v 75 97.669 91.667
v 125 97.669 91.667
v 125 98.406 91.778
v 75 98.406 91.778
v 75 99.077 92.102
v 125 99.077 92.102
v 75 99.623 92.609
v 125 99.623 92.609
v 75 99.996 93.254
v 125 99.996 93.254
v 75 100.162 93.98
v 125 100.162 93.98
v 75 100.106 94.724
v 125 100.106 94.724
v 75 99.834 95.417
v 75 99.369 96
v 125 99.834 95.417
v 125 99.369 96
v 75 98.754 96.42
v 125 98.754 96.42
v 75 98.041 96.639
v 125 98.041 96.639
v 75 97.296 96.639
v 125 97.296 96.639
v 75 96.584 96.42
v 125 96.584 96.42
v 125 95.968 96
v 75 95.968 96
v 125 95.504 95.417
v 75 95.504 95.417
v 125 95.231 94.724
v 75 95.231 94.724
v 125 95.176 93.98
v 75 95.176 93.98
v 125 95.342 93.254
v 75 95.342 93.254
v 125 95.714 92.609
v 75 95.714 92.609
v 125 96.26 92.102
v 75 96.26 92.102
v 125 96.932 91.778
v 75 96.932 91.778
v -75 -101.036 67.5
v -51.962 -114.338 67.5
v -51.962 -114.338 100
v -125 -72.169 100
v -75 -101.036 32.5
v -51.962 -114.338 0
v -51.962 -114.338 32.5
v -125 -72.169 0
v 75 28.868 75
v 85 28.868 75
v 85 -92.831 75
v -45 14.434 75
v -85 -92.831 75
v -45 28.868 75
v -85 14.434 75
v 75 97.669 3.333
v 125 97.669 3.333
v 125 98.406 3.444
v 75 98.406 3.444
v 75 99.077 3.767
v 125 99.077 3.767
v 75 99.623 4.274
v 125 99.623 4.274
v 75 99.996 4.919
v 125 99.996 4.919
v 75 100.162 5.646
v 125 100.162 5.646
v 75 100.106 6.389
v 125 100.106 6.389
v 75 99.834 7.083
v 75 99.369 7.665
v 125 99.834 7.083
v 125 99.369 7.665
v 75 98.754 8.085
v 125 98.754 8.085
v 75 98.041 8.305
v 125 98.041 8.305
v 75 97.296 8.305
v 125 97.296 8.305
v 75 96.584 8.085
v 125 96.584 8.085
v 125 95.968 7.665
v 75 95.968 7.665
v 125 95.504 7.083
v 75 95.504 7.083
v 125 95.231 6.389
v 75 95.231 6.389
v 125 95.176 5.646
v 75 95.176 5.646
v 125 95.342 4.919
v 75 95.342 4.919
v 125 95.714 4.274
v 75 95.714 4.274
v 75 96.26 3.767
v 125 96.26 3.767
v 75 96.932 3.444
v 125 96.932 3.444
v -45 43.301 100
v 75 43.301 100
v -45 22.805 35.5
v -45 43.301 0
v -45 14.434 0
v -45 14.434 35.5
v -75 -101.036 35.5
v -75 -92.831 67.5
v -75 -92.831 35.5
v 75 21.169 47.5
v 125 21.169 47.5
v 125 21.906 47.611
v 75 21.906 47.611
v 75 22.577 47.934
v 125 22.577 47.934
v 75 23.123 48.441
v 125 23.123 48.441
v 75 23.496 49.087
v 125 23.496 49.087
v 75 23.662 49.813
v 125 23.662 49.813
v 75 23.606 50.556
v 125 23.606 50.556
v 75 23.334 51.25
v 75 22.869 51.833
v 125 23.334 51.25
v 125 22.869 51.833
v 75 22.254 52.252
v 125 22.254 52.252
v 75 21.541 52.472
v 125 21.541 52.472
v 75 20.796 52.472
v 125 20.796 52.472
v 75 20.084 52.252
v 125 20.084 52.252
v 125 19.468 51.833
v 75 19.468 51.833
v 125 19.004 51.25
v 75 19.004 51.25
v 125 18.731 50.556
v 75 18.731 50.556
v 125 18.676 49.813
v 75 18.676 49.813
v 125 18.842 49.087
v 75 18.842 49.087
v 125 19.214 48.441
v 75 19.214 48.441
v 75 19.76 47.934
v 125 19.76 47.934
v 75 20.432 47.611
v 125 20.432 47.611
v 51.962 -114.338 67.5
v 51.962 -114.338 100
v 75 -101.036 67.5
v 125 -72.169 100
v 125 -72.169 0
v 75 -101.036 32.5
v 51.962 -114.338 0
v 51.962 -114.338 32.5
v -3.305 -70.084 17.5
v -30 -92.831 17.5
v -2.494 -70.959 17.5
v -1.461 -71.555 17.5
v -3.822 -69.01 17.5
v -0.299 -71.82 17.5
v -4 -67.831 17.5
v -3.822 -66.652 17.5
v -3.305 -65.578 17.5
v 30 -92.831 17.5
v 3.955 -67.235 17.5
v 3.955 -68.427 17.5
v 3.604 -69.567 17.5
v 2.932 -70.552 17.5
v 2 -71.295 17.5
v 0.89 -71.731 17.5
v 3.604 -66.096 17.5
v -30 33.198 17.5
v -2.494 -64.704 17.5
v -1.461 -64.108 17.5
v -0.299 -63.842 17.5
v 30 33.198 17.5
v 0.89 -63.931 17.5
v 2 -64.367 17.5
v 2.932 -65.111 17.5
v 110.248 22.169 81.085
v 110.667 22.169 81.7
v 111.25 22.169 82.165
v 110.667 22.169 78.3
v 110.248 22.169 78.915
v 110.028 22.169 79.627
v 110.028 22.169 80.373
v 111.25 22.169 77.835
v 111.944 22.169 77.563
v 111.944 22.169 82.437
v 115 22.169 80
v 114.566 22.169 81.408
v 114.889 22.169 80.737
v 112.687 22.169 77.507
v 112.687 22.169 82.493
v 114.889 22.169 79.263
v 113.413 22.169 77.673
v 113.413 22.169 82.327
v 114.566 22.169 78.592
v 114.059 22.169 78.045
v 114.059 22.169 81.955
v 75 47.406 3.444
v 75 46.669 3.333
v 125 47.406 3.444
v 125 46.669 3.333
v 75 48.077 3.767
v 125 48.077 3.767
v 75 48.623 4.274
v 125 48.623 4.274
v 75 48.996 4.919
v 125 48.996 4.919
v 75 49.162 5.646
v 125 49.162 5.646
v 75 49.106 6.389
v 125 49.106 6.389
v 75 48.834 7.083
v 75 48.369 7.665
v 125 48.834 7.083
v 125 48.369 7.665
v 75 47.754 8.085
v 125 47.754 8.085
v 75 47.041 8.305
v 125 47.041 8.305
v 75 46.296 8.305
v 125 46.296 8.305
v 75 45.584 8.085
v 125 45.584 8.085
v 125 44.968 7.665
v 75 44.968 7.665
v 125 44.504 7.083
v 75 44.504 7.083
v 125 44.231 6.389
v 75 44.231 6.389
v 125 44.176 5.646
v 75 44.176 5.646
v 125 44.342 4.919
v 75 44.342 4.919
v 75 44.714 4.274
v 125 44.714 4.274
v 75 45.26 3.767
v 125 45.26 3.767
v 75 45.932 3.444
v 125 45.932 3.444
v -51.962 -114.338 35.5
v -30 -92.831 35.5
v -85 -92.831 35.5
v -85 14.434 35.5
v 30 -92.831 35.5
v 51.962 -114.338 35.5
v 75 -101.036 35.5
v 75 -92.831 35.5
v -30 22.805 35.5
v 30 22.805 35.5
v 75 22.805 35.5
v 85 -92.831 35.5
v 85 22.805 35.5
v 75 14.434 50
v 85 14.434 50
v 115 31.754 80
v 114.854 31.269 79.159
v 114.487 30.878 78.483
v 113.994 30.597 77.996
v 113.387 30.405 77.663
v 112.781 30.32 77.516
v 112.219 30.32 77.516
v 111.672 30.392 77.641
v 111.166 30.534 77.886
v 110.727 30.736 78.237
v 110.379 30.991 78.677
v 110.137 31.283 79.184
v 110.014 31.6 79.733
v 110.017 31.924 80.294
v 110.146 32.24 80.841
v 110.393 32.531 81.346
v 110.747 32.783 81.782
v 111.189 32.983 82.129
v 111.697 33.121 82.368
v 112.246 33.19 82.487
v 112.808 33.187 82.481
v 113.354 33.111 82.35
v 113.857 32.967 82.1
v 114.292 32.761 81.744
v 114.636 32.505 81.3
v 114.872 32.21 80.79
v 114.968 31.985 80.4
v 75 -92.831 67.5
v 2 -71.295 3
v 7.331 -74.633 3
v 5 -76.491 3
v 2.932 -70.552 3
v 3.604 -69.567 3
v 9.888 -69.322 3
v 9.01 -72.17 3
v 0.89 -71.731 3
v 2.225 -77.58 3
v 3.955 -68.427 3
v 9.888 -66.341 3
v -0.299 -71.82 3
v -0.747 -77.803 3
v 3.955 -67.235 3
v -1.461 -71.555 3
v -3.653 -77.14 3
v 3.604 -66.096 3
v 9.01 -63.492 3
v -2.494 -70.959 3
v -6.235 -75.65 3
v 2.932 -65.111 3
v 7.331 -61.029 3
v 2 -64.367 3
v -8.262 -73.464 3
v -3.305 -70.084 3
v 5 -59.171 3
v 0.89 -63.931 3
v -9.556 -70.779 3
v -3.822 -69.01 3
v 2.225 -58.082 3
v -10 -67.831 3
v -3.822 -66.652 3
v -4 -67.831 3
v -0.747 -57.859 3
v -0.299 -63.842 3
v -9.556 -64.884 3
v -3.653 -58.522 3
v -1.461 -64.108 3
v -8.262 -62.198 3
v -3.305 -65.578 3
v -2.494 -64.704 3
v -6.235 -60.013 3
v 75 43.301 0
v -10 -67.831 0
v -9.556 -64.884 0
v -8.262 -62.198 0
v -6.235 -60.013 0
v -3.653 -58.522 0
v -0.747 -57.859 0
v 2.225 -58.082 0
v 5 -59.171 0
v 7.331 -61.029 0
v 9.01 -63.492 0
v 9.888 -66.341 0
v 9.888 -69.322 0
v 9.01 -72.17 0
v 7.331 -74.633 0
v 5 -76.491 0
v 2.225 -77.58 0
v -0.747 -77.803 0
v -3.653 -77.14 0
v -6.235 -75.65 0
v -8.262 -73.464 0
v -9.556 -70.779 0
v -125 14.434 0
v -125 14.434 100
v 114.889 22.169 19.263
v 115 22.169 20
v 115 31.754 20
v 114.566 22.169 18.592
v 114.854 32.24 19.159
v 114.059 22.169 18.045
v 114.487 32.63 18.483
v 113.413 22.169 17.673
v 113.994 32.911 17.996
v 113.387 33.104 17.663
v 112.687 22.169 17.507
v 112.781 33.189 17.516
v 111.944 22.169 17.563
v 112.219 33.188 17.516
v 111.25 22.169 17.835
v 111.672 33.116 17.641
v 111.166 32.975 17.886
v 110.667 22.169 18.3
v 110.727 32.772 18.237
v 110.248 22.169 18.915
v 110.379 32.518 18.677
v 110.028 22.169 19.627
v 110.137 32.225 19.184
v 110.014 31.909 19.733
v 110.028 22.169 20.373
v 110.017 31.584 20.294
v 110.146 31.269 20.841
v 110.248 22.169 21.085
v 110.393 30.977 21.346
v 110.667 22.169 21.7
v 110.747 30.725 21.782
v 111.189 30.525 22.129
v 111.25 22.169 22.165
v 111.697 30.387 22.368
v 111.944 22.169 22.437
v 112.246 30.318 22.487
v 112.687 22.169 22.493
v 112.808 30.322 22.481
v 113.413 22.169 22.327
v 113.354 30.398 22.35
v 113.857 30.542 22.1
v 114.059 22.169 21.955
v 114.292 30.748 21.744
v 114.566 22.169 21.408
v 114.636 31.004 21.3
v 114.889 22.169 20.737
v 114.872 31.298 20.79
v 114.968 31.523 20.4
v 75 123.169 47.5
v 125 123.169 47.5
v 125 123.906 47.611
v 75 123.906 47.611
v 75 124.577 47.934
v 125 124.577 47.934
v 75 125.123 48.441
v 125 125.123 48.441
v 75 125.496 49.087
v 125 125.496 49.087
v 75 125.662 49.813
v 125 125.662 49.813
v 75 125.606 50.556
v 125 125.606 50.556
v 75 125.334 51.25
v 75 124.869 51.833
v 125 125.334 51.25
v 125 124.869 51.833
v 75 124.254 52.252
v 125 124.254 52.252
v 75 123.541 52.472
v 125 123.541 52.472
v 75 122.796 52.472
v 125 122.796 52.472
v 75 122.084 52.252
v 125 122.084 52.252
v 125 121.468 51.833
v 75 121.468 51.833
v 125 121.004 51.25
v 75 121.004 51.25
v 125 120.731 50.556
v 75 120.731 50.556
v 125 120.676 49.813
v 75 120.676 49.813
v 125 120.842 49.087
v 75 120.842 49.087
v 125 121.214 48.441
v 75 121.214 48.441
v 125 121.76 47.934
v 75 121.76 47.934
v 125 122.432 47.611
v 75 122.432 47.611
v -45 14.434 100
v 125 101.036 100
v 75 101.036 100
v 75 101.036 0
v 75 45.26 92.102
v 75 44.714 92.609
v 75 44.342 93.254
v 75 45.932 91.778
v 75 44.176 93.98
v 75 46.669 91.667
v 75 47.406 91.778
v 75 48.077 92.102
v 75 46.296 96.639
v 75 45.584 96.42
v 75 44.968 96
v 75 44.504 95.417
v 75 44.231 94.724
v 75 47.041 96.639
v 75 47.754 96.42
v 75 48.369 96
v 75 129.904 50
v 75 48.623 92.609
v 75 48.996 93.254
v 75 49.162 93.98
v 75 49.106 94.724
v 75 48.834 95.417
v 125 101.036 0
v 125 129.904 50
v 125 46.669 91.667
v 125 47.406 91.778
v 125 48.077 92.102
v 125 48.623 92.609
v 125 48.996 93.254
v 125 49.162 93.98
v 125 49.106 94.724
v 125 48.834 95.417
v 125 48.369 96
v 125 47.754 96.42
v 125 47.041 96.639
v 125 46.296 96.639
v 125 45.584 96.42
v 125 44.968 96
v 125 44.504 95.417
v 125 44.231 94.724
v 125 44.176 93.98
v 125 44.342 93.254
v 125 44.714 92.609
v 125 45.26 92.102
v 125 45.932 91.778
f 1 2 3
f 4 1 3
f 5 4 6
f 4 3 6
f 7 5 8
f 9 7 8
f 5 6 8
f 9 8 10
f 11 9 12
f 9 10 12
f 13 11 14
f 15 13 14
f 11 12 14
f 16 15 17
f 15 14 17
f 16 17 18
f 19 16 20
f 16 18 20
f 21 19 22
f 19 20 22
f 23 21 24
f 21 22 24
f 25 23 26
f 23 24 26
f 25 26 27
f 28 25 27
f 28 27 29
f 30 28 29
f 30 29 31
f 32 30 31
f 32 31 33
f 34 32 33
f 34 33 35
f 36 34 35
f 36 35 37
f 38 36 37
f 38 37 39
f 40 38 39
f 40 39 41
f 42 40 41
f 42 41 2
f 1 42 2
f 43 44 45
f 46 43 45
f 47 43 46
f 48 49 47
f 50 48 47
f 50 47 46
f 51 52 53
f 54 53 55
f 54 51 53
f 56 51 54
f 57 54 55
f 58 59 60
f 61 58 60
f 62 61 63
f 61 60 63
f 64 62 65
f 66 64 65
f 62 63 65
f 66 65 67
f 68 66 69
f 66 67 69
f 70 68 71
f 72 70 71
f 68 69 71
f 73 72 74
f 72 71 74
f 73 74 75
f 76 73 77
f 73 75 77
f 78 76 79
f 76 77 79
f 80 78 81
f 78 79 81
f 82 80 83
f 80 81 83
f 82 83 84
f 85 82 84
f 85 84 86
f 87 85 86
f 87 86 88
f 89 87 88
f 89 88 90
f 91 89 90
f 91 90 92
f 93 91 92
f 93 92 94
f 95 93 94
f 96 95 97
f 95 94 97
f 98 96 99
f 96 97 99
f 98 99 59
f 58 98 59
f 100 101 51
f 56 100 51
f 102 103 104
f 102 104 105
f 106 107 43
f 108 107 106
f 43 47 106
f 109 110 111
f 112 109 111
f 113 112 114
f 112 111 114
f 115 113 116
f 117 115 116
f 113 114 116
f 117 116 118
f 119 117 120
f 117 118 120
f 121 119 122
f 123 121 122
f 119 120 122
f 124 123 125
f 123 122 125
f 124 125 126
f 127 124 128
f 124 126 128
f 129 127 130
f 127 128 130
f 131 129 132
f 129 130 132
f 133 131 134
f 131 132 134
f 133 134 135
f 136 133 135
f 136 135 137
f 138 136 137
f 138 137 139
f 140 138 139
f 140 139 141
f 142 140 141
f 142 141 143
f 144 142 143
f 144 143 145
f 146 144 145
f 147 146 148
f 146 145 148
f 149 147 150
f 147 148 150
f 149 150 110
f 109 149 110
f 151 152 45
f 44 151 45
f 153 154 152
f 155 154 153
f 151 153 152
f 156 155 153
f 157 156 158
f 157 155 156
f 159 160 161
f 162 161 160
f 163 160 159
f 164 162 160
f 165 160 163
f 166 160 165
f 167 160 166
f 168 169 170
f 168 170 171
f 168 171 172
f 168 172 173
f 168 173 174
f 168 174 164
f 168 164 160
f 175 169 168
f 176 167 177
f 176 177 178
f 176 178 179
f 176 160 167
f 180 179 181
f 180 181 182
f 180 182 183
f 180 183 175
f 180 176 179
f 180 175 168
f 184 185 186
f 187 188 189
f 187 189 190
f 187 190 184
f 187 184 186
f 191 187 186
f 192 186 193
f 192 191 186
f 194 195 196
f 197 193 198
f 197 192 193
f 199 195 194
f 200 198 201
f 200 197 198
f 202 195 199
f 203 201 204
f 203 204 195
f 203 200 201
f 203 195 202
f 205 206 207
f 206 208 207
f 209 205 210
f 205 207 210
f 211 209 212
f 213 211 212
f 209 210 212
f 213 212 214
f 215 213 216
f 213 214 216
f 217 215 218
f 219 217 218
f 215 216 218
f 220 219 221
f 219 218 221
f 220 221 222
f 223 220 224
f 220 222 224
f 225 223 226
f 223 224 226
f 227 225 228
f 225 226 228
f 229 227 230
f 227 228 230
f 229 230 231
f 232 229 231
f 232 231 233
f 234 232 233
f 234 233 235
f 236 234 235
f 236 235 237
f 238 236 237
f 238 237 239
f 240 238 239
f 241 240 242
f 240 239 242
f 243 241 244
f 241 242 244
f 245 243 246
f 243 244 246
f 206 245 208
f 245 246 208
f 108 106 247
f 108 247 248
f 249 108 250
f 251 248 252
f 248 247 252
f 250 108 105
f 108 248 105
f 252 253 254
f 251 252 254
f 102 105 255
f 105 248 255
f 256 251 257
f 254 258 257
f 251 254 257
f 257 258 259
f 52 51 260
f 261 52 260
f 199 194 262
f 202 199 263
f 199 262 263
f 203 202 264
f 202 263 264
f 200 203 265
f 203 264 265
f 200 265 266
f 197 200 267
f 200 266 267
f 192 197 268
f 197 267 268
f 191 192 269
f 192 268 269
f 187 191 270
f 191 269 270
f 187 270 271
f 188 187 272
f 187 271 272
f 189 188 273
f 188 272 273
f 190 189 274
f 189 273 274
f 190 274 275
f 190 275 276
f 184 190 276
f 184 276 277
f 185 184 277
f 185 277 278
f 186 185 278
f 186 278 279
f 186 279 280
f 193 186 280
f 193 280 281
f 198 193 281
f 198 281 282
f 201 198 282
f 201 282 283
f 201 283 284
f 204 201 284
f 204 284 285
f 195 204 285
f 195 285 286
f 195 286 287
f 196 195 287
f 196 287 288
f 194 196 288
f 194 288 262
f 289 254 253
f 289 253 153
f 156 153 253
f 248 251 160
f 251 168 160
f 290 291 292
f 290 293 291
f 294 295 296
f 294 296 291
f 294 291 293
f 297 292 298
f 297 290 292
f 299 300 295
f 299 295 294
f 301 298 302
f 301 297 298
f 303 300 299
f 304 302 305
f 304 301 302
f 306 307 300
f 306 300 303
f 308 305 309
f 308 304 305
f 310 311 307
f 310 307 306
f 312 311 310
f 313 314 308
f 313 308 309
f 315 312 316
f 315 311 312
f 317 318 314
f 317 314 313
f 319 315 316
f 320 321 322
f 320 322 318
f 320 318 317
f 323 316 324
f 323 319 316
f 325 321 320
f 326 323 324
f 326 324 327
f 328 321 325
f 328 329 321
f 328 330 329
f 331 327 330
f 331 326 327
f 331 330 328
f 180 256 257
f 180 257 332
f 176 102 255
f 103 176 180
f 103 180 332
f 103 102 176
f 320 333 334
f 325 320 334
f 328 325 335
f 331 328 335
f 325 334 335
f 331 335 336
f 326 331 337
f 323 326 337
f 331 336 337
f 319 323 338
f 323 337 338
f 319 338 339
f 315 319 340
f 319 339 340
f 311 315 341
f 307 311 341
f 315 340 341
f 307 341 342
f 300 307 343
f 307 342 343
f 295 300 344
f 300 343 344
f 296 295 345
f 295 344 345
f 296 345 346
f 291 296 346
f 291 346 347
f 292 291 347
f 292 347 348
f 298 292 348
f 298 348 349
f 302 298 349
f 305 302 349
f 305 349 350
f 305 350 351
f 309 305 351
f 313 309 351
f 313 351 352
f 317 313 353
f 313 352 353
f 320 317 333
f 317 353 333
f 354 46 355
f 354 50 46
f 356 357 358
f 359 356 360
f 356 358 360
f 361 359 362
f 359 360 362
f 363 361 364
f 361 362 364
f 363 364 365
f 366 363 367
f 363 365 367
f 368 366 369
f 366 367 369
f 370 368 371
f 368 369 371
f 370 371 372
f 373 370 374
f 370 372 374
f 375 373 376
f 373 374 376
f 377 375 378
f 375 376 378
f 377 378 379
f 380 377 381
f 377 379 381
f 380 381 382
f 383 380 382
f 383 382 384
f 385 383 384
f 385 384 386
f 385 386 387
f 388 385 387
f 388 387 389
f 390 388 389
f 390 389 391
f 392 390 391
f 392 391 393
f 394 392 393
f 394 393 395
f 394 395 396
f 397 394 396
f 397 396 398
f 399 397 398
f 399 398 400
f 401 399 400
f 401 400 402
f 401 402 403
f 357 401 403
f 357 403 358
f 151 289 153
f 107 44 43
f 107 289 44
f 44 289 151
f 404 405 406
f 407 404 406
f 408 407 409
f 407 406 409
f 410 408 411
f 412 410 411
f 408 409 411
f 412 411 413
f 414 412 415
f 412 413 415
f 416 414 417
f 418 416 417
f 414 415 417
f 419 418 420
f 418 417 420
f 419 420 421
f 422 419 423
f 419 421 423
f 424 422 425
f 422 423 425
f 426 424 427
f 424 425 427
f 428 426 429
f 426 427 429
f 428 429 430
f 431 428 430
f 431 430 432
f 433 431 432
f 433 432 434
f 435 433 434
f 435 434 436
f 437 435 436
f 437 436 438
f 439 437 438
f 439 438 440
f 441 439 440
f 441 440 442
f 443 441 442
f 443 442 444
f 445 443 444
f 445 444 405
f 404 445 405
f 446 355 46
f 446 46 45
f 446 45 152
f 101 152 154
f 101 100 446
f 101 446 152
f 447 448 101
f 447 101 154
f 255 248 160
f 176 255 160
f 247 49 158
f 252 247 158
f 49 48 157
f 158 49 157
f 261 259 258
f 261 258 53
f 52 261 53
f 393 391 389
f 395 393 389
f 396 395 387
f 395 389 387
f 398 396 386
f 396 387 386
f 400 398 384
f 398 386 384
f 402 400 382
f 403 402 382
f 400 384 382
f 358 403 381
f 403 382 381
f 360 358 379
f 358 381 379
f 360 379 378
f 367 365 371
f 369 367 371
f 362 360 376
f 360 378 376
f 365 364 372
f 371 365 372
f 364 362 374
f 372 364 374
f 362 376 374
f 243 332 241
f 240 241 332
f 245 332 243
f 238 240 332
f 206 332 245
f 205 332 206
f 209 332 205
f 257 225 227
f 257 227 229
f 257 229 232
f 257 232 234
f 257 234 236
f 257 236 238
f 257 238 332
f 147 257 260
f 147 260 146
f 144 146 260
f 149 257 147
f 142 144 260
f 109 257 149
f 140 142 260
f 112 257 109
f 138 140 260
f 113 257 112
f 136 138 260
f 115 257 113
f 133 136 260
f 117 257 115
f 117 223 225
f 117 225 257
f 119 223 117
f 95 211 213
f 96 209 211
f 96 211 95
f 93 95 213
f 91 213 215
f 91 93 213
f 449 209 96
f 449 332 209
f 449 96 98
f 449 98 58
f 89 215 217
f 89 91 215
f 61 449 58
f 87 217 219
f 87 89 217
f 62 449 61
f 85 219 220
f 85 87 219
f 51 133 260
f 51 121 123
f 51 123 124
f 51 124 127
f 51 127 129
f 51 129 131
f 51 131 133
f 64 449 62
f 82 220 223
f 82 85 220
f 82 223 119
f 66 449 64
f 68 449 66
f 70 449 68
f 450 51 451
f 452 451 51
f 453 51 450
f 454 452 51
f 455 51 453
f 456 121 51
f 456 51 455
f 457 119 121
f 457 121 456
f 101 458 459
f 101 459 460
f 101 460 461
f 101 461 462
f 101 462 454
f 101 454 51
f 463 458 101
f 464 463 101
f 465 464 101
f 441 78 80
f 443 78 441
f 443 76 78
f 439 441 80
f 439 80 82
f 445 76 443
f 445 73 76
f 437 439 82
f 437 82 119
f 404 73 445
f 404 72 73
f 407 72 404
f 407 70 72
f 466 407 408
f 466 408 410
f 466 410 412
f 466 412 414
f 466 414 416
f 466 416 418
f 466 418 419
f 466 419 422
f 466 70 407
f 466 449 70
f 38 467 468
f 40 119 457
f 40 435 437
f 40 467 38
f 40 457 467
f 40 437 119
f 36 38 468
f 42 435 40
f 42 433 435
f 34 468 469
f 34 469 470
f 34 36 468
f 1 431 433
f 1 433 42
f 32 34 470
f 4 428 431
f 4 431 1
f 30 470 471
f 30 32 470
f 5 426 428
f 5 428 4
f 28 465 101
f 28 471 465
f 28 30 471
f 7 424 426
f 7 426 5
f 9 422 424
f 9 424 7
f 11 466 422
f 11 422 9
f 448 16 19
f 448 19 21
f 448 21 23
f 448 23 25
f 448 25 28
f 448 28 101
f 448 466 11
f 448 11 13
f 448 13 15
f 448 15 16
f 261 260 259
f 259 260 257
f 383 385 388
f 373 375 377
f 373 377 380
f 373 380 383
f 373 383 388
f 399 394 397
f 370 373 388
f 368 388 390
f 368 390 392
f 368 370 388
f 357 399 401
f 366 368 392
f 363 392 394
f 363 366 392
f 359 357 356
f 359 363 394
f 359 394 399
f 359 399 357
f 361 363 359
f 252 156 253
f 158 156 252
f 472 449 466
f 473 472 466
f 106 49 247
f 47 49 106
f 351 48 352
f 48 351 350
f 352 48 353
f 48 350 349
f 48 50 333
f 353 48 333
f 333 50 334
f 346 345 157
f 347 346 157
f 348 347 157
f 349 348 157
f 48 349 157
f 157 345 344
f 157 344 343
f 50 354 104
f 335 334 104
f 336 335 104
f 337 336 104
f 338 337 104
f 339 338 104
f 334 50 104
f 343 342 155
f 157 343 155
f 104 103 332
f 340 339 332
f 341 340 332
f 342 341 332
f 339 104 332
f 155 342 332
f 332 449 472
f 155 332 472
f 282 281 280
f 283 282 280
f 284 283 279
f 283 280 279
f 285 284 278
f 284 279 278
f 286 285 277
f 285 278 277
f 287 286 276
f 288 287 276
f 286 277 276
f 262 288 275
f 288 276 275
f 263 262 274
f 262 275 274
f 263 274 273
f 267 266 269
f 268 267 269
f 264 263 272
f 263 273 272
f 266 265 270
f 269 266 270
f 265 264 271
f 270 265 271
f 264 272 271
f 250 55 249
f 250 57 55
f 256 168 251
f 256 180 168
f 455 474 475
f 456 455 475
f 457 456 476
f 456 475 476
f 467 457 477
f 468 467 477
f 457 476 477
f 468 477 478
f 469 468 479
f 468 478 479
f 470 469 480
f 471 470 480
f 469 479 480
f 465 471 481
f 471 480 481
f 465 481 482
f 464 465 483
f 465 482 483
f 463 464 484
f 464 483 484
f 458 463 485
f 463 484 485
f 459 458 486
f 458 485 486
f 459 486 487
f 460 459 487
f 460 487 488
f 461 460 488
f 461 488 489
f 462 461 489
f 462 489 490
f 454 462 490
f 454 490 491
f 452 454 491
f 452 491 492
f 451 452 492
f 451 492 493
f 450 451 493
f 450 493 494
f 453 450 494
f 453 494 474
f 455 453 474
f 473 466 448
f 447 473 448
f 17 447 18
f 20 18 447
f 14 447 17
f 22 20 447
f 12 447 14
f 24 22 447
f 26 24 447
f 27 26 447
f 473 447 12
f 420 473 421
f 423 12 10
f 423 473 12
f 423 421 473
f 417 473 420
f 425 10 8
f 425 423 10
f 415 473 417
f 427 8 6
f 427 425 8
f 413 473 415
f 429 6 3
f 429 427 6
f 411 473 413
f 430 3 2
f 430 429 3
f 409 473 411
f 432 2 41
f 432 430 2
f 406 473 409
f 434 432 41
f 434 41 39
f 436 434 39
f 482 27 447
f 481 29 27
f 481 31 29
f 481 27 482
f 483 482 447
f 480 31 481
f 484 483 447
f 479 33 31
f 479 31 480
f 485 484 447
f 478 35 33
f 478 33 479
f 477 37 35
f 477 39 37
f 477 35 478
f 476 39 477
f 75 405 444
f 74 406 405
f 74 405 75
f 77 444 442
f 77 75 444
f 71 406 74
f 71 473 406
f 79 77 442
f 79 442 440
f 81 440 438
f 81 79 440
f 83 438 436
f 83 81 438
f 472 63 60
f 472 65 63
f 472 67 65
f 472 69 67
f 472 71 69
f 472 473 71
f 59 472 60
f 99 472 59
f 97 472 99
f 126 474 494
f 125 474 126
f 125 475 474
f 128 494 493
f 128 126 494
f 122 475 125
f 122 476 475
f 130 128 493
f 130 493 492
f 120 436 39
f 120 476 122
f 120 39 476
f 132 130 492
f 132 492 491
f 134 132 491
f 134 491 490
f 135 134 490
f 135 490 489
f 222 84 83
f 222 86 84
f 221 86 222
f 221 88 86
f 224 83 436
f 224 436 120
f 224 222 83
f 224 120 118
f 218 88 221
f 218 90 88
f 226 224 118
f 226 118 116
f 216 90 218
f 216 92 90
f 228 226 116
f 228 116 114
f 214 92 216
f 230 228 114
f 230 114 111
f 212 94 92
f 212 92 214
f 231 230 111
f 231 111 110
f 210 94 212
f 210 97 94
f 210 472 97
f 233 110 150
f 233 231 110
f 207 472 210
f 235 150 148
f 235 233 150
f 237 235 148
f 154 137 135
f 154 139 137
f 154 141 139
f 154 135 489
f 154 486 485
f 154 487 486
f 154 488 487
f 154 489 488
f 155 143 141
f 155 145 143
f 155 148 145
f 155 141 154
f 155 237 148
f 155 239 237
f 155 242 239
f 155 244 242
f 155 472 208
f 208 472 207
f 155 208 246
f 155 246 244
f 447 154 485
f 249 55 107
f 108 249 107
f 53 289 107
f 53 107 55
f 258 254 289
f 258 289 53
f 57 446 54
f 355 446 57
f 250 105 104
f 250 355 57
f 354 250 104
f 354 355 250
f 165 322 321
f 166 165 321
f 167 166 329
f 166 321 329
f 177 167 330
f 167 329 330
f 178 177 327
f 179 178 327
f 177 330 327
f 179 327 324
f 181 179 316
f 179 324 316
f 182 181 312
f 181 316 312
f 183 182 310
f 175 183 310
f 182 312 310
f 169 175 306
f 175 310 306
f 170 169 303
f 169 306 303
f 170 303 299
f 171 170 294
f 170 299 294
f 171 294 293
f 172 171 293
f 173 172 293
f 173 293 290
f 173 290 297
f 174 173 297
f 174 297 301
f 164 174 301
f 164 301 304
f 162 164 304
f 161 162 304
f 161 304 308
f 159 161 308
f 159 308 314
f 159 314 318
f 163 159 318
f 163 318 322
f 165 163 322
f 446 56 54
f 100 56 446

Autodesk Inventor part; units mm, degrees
ref_plane "YZ Plane" through (0, 0, 0) normal (1, 0, 0) x (0, 1, 0)
ref_plane "XZ Plane" through (0, 0, 0) normal (0, 1, 0) x (-1, 0, 0)
ref_plane "XY Plane" through (0, 0, 0) normal (0, 0, 1) x (1, 0, 0)
sketch "Sketch1" plane through (0, 0, 0) normal (0, 0, 1) x (1, 0, 0)
  line L0 (0, -144.3376) -> (-125, -72.1688)
  line L1 (-125, -72.1688) -> (-125, 72.1688)
  line L2 (-125, 72.1688) -> (0, 144.3376) construction
  line L3 (0, 144.3376) -> (125, 72.1688) construction
  line L4 (125, 72.1688) -> (125, -72.1688)
  line L5 (125, -72.1688) -> (0, -144.3376)
  line L6 (125, 72.1688) -> (-125, 72.1688)
  line L7 (125, 72.1688) -> (-125, 72.1688)
  line L8 (-125, 72.1688) -> (-125, 144.3376)
  line L9 (-125, 144.3376) -> (125, 144.3376)
  line L10 (125, 144.3376) -> (125, 72.1688)
  point P0 (0, 0)
  point P1 (0, 0)
  dimension "d0" = 250
extrude "Extrusion1" add sketch "Sketch1" along normal blind 100 contours L0 L1 L6 L4 L5
sketch "Sketch2" plane through (-125, 72.1688, 0) normal (0, 1, 0) x (1, 0, 0)
  line L0 (200, -67.5) -> (50, -67.5)
  line L1 (50, -67.5) -> (50, -32.5)
  line L2 (50, -32.5) -> (200, -32.5)
  line L3 (200, -32.5) -> (200, -67.5)
  line L4 (0, 0) -> (0, -100) projected
  line L5 (0, 0) -> (250, 0) projected
  point P0 (125, -32.5)
  point P1 (50, -50)
  point P2 (125, 0)
  point P3 (0, -50)
  dimension "d3" = 150
  dimension "d4" = 35
extrude "Extrusion2" cut sketch "Sketch2" against normal through all
sketch "Sketch3" plane through (0, 0, 100) normal (0, 0, 1) x (1, 0, 0)
  line L0 (125, -114.3376) -> (-125, -114.3376)
  line L1 (-125, -114.3376) -> (-125, -144.3376)
  line L2 (-125, -144.3376) -> (125, -144.3376)
  line L3 (125, -144.3376) -> (125, -114.3376)
  point P0 (0, 0)
  point P1 (0, -144.3376)
  point P2 (0, -114.3376)
  point P3 (125, -72.1688)
  dimension "d7" = 30
extrude "Extrusion3" cut sketch "Sketch3" against normal through all
sketch "Sketch4" plane through (125, -72.1688, 0) normal (1, 0, 0) x (0, 0, -1)
  circle A0 centre (-50, 119.3376) radius 3
  line L0 (0, 144.3376) -> (-100, 144.3376) projected
  point P0 (-50, 144.3376)
  dimension "d14" = 6
  dimension "d15" = 25
extrude "Extrusion4" cut sketch "Sketch4" against normal through all
sketch "Sketch5" plane through (-125, -72.1688, 0) normal (-1, 0, 0) x (0, 0, 1)
  circle A0 centre (50, 119.3376) radius 3 projected
  circle A1 centre (50, 112.3376) radius 1.5
  circle A2 centre (65.5, 112.3376) radius 1.5
  circle A3 centre (57.75, 125.761) radius 1.5
  circle A4 centre (42.25, 125.761) radius 1.5
  circle A5 centre (34.5, 112.3376) radius 1.5
  circle A6 centre (42.25, 98.9142) radius 1.5
  circle A7 centre (57.75, 98.9142) radius 1.5
  circle A8 centre (50, 119.3376) radius 6
  point P0 (0, 72.1688)
  dimension "d16" = 3
  dimension "d17" = 3
  dimension "d18" = 7
  dimension "d19" = 15.5
  dimension "d22" = 360
  dimension "d26" = 12
extrude "Extrusion5" cut sketch "Sketch5" against normal blind 75 contours A0 | A8 A1 | A1 A8 | A2 | A3 | A4 | A5 | A6 | A7 picked at (49.946, 113.508) picked at (48.5874, 114.6648)
sketch "Sketch6" plane through (-75, 72.1688, 67.5) normal (1, 0, 0) x (0, 0, -1)
  circle A0 centre (17.5, -32) radius 20
  circle A1 centre (33, -32) radius 1.5 projected
  circle A2 centre (17.5, -25) radius 6 projected
  point P0 (67.5, -72.1688)
  dimension "d27" = 40
extrude "Extrusion6" cut sketch "Sketch6" along normal blind 150 and the other way blind 45 contours A0 | A1 | A2
sketch "Sketch7" plane through (-125, 72.1688, 0) normal (0, 1, 0) x (1, 0, 0)
  line L0 (50, -25) -> (200, -25)
  line L1 (200, -25) -> (200, -75)
  line L2 (200, -75) -> (50, -75)
  line L3 (50, -75) -> (50, -25)
  line L4 (50, -67.5) -> (50, -32.5) projected
  line L5 (200, -32.5) -> (200, -67.5) projected
  point P0 (125, 0)
  point P1 (50, -50)
  dimension "d32" = 50
extrude "Extrusion7" cut sketch "Sketch7" against normal blind 50
sketch "Sketch8" plane through (-125, 72.1688, 0) normal (0, 1, 0) x (1, 0, 0)
  line L0 (12.5, -20) -> (237.5, -20) construction
  line L1 (237.5, -20) -> (237.5, -80) construction
  line L2 (237.5, -80) -> (12.5, -80) construction
  line L3 (12.5, -80) -> (12.5, -20) construction
  line L4 (50, -75) -> (50, -25) construction
  line L5 (50, -25) -> (200, -25) construction
  circle A0 centre (12.5, -20) radius 2.5
  circle A1 centre (12.5, -80) radius 2.5
  circle A2 centre (237.5, -80) radius 2.5
  circle A3 centre (237.5, -20) radius 2.5
  point P0 (125, 0)
  point P1 (125, -25)
  point P2 (125, -25)
  point P3 (125, -20)
  point P4 (50, -50)
  point P5 (12.5, -50)
  dimension "d35" = 225
  dimension "d36" = 60
  dimension "d37" = 5
  dimension "d38" = 5
  dimension "d39" = 5
  dimension "d40" = 5
extrude "Extrusion8" cut sketch "Sketch8" against normal blind 50
sketch "Sketch9" plane through (-125, -72.1688, 0) normal (-1, 0, 0) x (0, 0, 1)
  circle A0 centre (34.5, 112.3376) radius 1.5 construction
  circle A1 centre (50, 119.3376) radius 3 construction
  line L0 (34.5, 112.3376) -> (50, 112.3376) construction
  circle A2 centre (50, 119.3376) radius 6 construction
  line L1 (50, 112.3376) -> (50, 119.3376) construction
  circle A3 centre (34.5, 112.3376) radius 4
  circle A4 centre (42.25, 98.9142) radius 4
  circle A5 centre (57.75, 98.9142) radius 4
  circle A6 centre (65.5, 112.3376) radius 4
  circle A7 centre (57.75, 125.761) radius 4
  circle A8 centre (42.25, 125.761) radius 4
  point P0 (0, 72.1688)
  dimension "d43" = 8
  dimension "d46" = 360
extrude "Extrusion9" cut sketch "Sketch9" against normal blind 3
sketch "Sketch10" plane through (-120, 40.1688, 50) normal (1, 0, 0) x (0, 0, -1)
  circle A0 centre (0, 7) radius 6 projected
  circle A1 centre (7.75, -13.4234) radius 1.5 projected
  circle A2 centre (7.75, 13.4234) radius 1.5 projected
  circle A3 centre (-15.5, 0) radius 1.5 projected
  circle A4 centre (-7.75, 13.4234) radius 1.5 projected
  circle A5 centre (15.5, 0) radius 1.5 projected
  circle A6 centre (-7.75, -13.4234) radius 1.5 projected
  circle A7 centre (0, 0) radius 20 projected
  point P0 (50, -40.1688)
extrude "Extrusion10" add sketch "Sketch10" along normal blind 5
sketch "Sketch11" plane through (-125, 72.1688, 0) normal (0, 1, 0) x (1, 0, 0)
  line L0 (155, -75) -> (95, -75)
  line L1 (95, -75) -> (95, -17.5)
  line L2 (95, -17.5) -> (155, -17.5)
  line L3 (155, -17.5) -> (155, -75)
  line L4 (210, -75) -> (40, -75)
  line L5 (40, -75) -> (40, -40)
  line L6 (210, -40) -> (210, -75)
  line L7 (210, -40) -> (40, -40)
  line L8 (50, -25) -> (200, -25) projected
  line L9 (200, -75) -> (50, -75) projected
  point P0 (125, 0)
  point P1 (125, -17.5)
  point P2 (125, -75)
  point P3 (125, -75)
  point P4 (125, -25)
  dimension "d52" = 60
  dimension "d56" = 170
  dimension "d57" = 35
  dimension "d62" = 7.5
extrude "Extrusion11" cut sketch "Sketch11" against normal blind 165
sketch "Sketch12" plane through (0, 0, 0) normal (0, 0, -1) x (-1, 0, 0)
  line L0 (75, 72.1688) -> (30, 72.1688) projected
  line L1 (75, 72.1688) -> (75, 22.1688) projected
  line L2 (75, 22.1688) -> (30, 22.1688) projected
  line L3 (-30, 22.1688) -> (-75, 22.1688) projected
  line L4 (-75, 72.1688) -> (-75, 22.1688) projected
  circle A0 centre (0, -67.8312) radius 4
  line L5 (-30, 72.1688) -> (-30, 22.1688) projected
  line L6 (-30, 72.1688) -> (-75, 72.1688) projected
  line L7 (30, 22.1688) -> (30, 72.1688) projected
  line L8 (-30, -92.8312) -> (30, -92.8312) projected
  point P0 (0, 0)
  point P1 (0, -92.8312)
  dimension "d58" = 8
  dimension "d65" = 25
extrude "Extrusion12" cut sketch "Sketch12" against normal blind 25 contours A0
sketch "Sketch13" plane through (-51.9615, -114.3376, 32.5) normal (0, 0, 1) x (1, 0, 0)
  line L0 (21.9615, 21.5064) -> (21.9615, 136.5064) projected
  line L1 (21.9615, 136.5064) -> (-23.0385, 136.5064) projected
  line L2 (-23.0385, 136.5064) -> (-23.0385, 13.3013) projected
  line L3 (0, 0) -> (-23.0385, 13.3013) projected
  line L4 (0, 0) -> (103.923, 0) projected
  line L5 (126.9615, 13.3013) -> (103.923, 0) projected
  line L6 (126.9615, 136.5064) -> (126.9615, 13.3013) projected
  line L7 (126.9615, 136.5064) -> (81.9615, 136.5064) projected
  line L8 (81.9615, 136.5064) -> (81.9615, 21.5064) projected
  line L9 (81.9615, 21.5064) -> (21.9615, 21.5064) projected
  point P0 (51.9615, 114.3376)
extrude "Extrusion13" add sketch "Sketch13" along normal blind 3
sketch "Sketch15" plane through (-75, 22.1688, 25) normal (1, 0, 0) x (0, 0, -1)
  line L0 (-10.5, 0) -> (0, 0) projected
  line L1 (0, 50) -> (0, 0) projected
  line L2 (-15, 50) -> (0, 50) projected
  line L3 (-15, 50) -> (-15, 35.3205) projected
  arc A0 (-15, 0.6795) -> (-15, 35.3205) centre (-25, 18) ccw projected
  line L4 (-15, 0.6795) -> (-15, -115) projected
  line L5 (-15, -115) -> (-42.5, -115) projected
  line L6 (-42.5, -115) -> (-42.5, -123.2051) projected
  line L7 (-10.5, -123.2051) -> (-42.5, -123.2051) projected
  line L8 (-10.5, -123.2051) -> (-10.5, 0) projected
  line L9 (-10.5, 0) -> (-10.5, 4.225)
  line L10 (-10.5, 31.775) -> (-10.5, 50)
  arc A1 (-10.5, 4.225) -> (-10.5, 31.775) centre (-25, 18) ccw
  point P0 (25, -22.1688)
extrude "Extrusion14" add sketch "Sketch15" along normal blind 45 contours L9 A0 L10 L2 L1 L0
sketch "Sketch16" plane through (75, 22.1688, 25) normal (-1, 0, 0) x (0, 0, 1)
  line L0 (0, 0) -> (10.5, 0) projected
  line L1 (10.5, 0) -> (10.5, -123.2051) projected
  line L2 (42.5, -123.2051) -> (10.5, -123.2051) projected
  line L3 (42.5, -115) -> (42.5, -123.2051) projected
  line L4 (42.5, -115) -> (15, -115) projected
  line L5 (15, -115) -> (15, 50) projected
  line L6 (0, 50) -> (15, 50) projected
  line L7 (0, 50) -> (0, 0) projected
  line L8 (10.5, 0) -> (10.5, -123.2051) projected
  line L9 (10.5, 0) -> (10.5, 50)
  line L10 (-25, 50) -> (75, 50) projected
  line L11 (10.5, 50) -> (0, 50)
  line L12 (-2.5, 50) -> (-2.5, 0) projected
  point P0 (-25, -22.1688)
extrude "Extrusion15" add sketch "Sketch16" along normal blind 45 contours L7 L6 L9 L0
sketch "Sketch17" plane through (-125, -92.8312, 0) normal (0, 1, 0) x (1, 0, 0)
  line L0 (200, -40) -> (210, -40) projected
  line L1 (200, -35.5) -> (200, -40) projected
  line L2 (50, -40) -> (50, -35.5) projected
  line L3 (40, -40) -> (50, -40) projected
  line L4 (176.9615, -35.5) -> (200, -35.5) projected
  line L5 (200, -35.5) -> (210, -35.5)
  line L6 (210, -35.5) -> (210, -40)
  line L7 (210, -40) -> (200, -40)
  line L8 (200, -40) -> (200, -35.5)
  line L9 (50, -35.5) -> (73.0385, -35.5) projected
  line L10 (50, -35.5) -> (40, -35.5)
  line L11 (40, -35.5) -> (40, -40)
  line L12 (40, -40) -> (50, -40)
  line L13 (50, -40) -> (50, -35.5)
  point P0 (125, 0)
extrude "Extrusion16" cut sketch "Sketch17" along normal through all
sketch "Sketch18" plane through (-85, -92.8312, 75) normal (1, 0, 0) x (0, 0, -1)
  arc A0 (39.5, 119.225) -> (39.5, 146.775) centre (25, 133) ccw projected
  line L0 (57.5, 165) -> (39.5, 165) projected
  circle A1 centre (25, 133) radius 20 projected
  line L1 (45, 133) -> (39.5, 133)
  line L2 (39.5, 133) -> (39.5, 165)
  line L3 (39.5, 165) -> (45, 165)
  line L4 (45, 165) -> (45, 133)
  point P0 (75, 92.8312)
extrude "Extrusion17" cut sketch "Sketch18" along normal blind 55 contours L1 L2 A0 | A0 L2 L0 L4
sketch "Sketch20" plane through (85, -92.8312, 75) normal (-1, 0, 0) x (0, 0, 1)
  circle A0 centre (-25, 140) radius 3 projected
  circle A1 centre (-25, 140) radius 11.5
  point P0 (-75, 92.8312)
  dimension "d74" = 23
extrude "Extrusion18" cut sketch "Sketch20" against normal through all
sketch "Sketch21" plane through (125, -72.1688, 0) normal (1, 0, 0) x (0, 0, -1)
  circle A0 centre (-50, 119.3376) radius 11.5 projected
  circle A1 centre (-50, 101.8376) radius 2.5
  circle A2 centre (-34.8446, 128.0876) radius 2.5
  circle A3 centre (-65.1554, 128.0876) radius 2.5
  point P0 (0, 72.1688)
  dimension "d77" = 17.5
  dimension "d78" = 5
  dimension "d81" = 360
extrude "Extrusion19" cut sketch "Sketch21" against normal blind 35 contours A1 | A2 | A3
sketch "Sketch22" plane through (0, 0, 0) normal (0, 0, -1) x (-1, 0, 0)
  circle A0 centre (0, -67.8312) radius 4 projected
  circle A1 centre (0, -67.8312) radius 10
  point P0 (0, 0)
  dimension "d85" = 20
extrude "Extrusion20" cut sketch "Sketch22" against normal blind 3
sketch "Sketch23" plane through (-85, -92.8312, 75) normal (1, 0, 0) x (0, 0, -1)
  circle A0 centre (17.25, 119.5766) radius 4 projected
  circle A1 centre (25, 140) radius 6 projected
  circle A2 centre (17.25, 119.5766) radius 1.5 projected
  circle A3 centre (40.5, 133) radius 1.5 projected
  circle A4 centre (17.25, 146.4234) radius 1.5 projected
  circle A5 centre (9.5, 133) radius 1.5 projected
  circle A6 centre (32.75, 146.4234) radius 1.5 projected
  circle A7 centre (32.75, 119.5766) radius 1.5 projected
  circle A8 centre (25, 133) radius 20 projected
  point P0 (75, 92.8312)
extrude "Extrusion21" add sketch "Sketch23" against normal blind 40 contours A0 | A1 | A2 | A3 | A4 | A5 | A6 | A7 | A8
sketch "Sketch24" plane through (85, -92.8312, 75) normal (-1, 0, 0) x (0, 0, 1)
  circle A0 centre (-25, 140) radius 11.5 projected
  point P0 (-75, 92.8312)
extrude "Extrusion22" add sketch "Sketch24" against normal blind 40
sketch "Sketch25" plane through (125, -72.1688, 0) normal (1, 0, 0) x (0, 0, -1)
  circle A0 centre (-65.1554, 128.0876) radius 2.5 projected
  circle A1 centre (-50, 101.8376) radius 2.5 projected
  circle A2 centre (-34.8446, 128.0876) radius 2.5 projected
  point P0 (0, 72.1688)
extrude "Extrusion23" add sketch "Sketch25" against normal blind 40
sketch "Sketch26" plane through (-125, -72.1688, 0) normal (-1, 0, 0) x (0, 0, 1)
  line L0 (0, 144.3376) -> (100, 144.3376) projected
  line L1 (50, 202.0726) -> (100, 173.2051)
  line L2 (100, 173.2051) -> (100, 115.4701)
  line L3 (100, 115.4701) -> (50, 86.6025)
  line L4 (50, 86.6025) -> (0, 115.4701)
  line L5 (0, 115.4701) -> (0, 173.2051)
  line L6 (0, 173.2051) -> (50, 202.0726)
  point P0 (50, 144.3376)
extrude "Extrusion24" cut sketch "Sketch26" against normal blind 200
sketch "Sketch29" plane through (75, -72.1688, 0) normal (-1, 0, 0) x (0, 0, 1)
  line L0 (100, 115.4701) -> (50, 86.6025) projected
  line L1 (50, 86.6025) -> (0, 115.4701) projected
  line L2 (50, 86.6025) -> (0, 115.4701)
  line L3 (0, 115.4701) -> (0, 173.2051)
  line L4 (0, 173.2051) -> (50, 202.0726)
  line L5 (50, 202.0726) -> (100, 173.2051)
  line L6 (100, 173.2051) -> (100, 115.4701)
  line L7 (100, 115.4701) -> (50, 86.6025)
  point P0 (0, 72.1688)
  point P1 (50, 144.3376)
extrude "Extrusion26" add sketch "Sketch29" against normal blind 50
sketch "Sketch30" plane through (125, -72.1688, 100) normal (1, 0, 0) x (0, 0, -1)
  line L0 (50, 202.0726) -> (0, 173.2051) projected
  line L1 (50, 202.0726) -> (100, 173.2051)
  line L2 (100, 173.2051) -> (100, 115.4701)
  line L3 (100, 115.4701) -> (50, 86.6025)
  line L4 (50, 86.6025) -> (0, 115.4701)
  line L5 (0, 115.4701) -> (0, 173.2051) construction
  line L6 (0, 173.2051) -> (50, 202.0726)
  circle A0 centre (50, 93.3376) radius 2.5
  circle A1 centre (94.1673, 118.8376) radius 2.5
  circle A2 centre (94.1673, 169.8376) radius 2.5
  circle A3 centre (50, 195.3376) radius 2.5
  circle A4 centre (5.8327, 169.8376) radius 2.5
  circle A5 centre (5.8327, 118.8376) radius 2.5
  point P0 (100, 72.1688)
  point P1 (50, 144.3376)
  dimension "d103" = 5
  dimension "d104" = 51
  dimension "d107" = 360
extrude "Extrusion27" cut sketch "Sketch30" against normal through all
sketch "Sketch31" plane through (-125, -72.1688, 0) normal (-1, 0, 0) x (0, 0, 1)
  line L0 (100, 86.6025) -> (0, 86.6025)
  line L1 (100, 115.4701) -> (50, 86.6025) projected
  line L2 (50, 86.6025) -> (0, 115.4701) projected
  line L3 (100, 115.4701) -> (100, 0) projected
  line L4 (0, 0) -> (0, 115.4701) projected
  line L5 (0, 86.6025) -> (0, 115.4701)
  line L6 (100, 115.4701) -> (100, 86.6025)
  line L7 (100, 0) -> (100, 173.2051) projected
  point P0 (0, 72.1688)
extrude "Extrusion28" cut sketch "Sketch31" against normal blind 80
properties part number "HA01" material "ABS Plastic"
